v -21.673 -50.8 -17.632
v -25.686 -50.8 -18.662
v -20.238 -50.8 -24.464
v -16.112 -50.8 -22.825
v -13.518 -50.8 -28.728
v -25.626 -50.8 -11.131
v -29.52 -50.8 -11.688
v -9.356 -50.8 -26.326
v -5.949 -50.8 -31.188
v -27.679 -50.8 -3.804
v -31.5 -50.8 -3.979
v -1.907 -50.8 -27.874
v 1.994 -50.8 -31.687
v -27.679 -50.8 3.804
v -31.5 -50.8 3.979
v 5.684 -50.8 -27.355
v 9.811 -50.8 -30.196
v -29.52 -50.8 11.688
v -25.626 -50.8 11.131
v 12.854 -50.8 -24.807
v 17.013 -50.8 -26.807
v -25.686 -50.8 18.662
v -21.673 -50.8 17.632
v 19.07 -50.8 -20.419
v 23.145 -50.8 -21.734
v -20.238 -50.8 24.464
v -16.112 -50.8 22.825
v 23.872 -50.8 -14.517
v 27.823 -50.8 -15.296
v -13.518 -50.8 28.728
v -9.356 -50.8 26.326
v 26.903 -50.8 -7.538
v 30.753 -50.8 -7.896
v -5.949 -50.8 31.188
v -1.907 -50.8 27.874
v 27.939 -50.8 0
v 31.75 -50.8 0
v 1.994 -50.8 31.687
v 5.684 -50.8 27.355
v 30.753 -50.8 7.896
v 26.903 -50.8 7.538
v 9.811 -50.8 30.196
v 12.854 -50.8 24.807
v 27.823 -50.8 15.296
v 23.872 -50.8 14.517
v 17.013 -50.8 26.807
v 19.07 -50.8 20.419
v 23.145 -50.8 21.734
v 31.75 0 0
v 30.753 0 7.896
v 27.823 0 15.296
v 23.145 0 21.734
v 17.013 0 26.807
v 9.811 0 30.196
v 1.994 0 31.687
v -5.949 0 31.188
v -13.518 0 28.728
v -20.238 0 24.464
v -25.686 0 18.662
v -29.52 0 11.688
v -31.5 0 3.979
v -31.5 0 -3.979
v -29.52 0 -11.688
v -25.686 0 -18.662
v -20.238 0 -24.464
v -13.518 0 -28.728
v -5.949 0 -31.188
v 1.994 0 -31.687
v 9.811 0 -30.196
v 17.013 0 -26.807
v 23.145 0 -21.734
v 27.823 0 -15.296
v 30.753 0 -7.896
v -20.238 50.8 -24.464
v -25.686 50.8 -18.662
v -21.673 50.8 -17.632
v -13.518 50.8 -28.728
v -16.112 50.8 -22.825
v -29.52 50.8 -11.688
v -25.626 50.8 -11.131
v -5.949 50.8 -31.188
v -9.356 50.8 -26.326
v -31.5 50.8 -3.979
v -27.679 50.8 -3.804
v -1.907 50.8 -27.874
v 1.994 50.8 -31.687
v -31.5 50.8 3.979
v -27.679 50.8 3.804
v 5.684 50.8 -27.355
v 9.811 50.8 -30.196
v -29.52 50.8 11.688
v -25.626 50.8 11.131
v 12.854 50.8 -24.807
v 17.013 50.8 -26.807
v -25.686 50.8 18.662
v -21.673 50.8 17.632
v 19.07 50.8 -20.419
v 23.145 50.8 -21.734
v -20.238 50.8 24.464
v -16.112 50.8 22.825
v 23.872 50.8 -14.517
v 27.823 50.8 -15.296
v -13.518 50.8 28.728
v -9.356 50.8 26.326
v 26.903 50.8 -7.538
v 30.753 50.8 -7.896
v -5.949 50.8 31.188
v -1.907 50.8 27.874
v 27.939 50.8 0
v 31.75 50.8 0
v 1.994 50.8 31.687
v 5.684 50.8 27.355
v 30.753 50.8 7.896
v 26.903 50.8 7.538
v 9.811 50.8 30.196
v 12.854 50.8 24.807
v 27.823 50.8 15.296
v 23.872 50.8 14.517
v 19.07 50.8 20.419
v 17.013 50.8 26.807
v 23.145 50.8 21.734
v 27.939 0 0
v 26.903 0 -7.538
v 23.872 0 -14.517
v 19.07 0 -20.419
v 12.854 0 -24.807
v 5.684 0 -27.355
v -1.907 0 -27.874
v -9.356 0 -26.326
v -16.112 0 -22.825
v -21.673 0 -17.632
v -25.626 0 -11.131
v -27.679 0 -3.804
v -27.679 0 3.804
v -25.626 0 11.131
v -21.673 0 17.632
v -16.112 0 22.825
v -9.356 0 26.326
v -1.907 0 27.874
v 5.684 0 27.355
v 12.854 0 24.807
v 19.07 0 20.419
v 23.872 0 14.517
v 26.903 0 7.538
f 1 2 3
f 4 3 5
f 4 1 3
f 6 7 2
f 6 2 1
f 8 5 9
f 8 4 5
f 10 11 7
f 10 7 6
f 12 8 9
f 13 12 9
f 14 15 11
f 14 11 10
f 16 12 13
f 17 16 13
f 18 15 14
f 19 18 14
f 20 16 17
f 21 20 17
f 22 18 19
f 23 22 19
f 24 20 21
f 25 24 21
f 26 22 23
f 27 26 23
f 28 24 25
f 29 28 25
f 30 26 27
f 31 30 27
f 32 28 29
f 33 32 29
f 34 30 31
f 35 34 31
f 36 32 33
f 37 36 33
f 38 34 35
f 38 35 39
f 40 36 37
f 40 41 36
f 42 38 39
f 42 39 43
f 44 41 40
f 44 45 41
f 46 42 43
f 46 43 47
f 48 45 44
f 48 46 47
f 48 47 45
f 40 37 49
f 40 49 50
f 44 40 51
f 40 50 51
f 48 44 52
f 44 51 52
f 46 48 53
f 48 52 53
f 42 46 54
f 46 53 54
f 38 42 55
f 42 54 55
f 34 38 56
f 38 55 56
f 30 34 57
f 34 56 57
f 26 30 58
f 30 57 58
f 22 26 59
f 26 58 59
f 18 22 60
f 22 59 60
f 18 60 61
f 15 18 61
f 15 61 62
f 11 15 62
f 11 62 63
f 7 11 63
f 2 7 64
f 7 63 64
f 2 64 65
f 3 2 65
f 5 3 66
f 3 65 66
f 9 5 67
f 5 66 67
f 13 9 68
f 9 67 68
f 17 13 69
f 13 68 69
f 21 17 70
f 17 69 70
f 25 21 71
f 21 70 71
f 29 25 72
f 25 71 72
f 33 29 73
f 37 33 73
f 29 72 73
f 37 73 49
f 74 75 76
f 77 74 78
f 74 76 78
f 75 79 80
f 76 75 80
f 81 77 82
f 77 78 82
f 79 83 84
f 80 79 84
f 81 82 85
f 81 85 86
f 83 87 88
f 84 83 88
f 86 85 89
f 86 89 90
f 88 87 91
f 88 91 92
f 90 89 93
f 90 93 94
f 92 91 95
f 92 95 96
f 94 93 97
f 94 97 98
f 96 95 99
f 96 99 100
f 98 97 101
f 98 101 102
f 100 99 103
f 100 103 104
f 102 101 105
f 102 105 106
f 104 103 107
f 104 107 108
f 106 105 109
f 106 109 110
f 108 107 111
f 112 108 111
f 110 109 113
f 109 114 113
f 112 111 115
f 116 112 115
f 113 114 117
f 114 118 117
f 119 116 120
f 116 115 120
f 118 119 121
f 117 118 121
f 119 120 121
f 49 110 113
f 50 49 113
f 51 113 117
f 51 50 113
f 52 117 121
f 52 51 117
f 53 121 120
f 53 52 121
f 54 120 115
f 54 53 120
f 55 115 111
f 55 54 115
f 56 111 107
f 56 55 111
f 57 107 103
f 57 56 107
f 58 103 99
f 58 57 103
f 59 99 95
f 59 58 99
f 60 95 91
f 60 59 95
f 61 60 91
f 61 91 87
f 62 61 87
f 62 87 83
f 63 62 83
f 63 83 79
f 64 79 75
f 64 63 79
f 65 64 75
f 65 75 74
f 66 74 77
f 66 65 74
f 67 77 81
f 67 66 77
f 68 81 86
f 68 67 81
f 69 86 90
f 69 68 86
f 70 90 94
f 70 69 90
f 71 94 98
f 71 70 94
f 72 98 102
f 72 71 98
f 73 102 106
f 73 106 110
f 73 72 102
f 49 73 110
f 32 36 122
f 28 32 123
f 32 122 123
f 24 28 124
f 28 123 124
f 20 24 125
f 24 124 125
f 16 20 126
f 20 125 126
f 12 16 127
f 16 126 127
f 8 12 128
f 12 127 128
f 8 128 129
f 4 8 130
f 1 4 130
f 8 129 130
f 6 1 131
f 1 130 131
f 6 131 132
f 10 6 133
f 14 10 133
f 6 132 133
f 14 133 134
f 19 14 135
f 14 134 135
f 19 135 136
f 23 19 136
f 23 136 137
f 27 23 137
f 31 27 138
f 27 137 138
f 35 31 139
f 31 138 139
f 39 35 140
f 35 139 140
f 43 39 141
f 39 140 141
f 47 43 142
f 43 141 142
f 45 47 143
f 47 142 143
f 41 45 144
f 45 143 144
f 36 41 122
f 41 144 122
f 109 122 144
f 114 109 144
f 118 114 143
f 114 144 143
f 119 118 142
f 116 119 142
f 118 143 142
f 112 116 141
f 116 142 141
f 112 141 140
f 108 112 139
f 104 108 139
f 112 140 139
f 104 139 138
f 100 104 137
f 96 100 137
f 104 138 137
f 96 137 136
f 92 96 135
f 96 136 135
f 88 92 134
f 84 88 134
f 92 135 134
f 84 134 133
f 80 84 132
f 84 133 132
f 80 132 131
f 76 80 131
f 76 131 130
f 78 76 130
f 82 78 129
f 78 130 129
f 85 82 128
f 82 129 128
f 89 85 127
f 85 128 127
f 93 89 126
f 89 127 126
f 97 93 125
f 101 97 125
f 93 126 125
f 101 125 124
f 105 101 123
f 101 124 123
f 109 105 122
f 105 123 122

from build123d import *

# Parameters (mm, degrees)
F0_R      = 31.75
F1_DEPTH  = 50.8
F1_FACE_R = 31.75
F2_DEPTH  = 50.8
F3_R      = 27.939053
F4_DEPTH  = 50.8
F4_FACE_R = 27.939053
F5_DEPTH  = 50.8


with BuildPart() as f1:
    # F0 (on Front) → F1 (new body)
    with BuildSketch(Plane.XZ):
        Circle(F0_R)
    extrude(amount=-F1_DEPTH)

    # F1_face (on face) → F2 (join)
    with BuildSketch(Plane.XZ):
        Circle(F1_FACE_R)
    extrude(amount=F2_DEPTH)

    # F3 (on Front) → F4 (cut)
    with BuildSketch(Plane.XZ):
        Circle(F3_R)
    extrude(amount=-F4_DEPTH, mode=Mode.SUBTRACT)

    # F4_face (on face) → F5 (cut)
    with BuildSketch(Plane(origin=(0, 0, 0), x_dir=(1, 0, 0), z_dir=(0, 1, 0))):
        Circle(F4_FACE_R)
    extrude(amount=-F5_DEPTH, mode=Mode.SUBTRACT)


solid = f1.part
